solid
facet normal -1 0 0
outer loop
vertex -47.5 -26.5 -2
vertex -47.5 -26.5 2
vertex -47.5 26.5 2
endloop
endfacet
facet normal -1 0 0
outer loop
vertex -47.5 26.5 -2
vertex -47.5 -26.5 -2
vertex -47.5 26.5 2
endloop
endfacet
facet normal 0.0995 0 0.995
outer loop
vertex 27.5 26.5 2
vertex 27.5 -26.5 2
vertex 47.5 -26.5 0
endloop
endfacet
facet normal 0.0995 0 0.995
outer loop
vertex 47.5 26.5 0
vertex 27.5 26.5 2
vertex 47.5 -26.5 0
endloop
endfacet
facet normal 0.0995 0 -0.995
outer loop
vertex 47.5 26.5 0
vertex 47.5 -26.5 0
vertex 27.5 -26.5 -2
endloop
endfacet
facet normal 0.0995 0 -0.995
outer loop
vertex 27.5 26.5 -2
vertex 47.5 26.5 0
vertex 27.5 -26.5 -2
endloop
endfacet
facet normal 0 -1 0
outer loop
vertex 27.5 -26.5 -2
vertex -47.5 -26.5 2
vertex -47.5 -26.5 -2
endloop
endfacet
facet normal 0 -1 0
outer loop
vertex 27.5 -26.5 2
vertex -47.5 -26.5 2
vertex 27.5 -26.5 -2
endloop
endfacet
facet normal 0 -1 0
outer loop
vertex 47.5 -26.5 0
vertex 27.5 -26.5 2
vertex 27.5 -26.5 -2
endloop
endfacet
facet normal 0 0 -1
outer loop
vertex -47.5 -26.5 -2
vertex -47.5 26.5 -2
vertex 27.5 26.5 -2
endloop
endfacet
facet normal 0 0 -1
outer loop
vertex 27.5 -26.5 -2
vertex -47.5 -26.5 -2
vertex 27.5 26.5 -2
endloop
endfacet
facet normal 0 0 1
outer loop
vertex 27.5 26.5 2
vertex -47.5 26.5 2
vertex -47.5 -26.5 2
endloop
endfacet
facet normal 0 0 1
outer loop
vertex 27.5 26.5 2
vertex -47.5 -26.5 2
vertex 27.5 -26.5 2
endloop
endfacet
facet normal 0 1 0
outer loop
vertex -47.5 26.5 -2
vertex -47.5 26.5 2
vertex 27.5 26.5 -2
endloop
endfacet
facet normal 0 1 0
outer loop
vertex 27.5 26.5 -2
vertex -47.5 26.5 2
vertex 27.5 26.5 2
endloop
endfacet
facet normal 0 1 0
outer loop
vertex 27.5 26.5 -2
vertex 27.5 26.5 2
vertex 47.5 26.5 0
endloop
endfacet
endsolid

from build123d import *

# Parameters (mm, degrees)
SKETCH_1_W               = 95
SKETCH_1_H               = 53
EXTRUDE_1_DEPTH          = 2
CUT_EXTRUDE_1_DEPTH      = 55.428852643
CUT_EXTRUDE_1_DEPTH_BACK = 55.428852643


with BuildPart() as part:
    # 草图1 → 凸台-拉伸1 (new, symmetric)
    with BuildSketch(Plane.XY):
        Rectangle(SKETCH_1_W, SKETCH_1_H)
    extrude(amount=EXTRUDE_1_DEPTH, both=True)

    # 草图2 → 切除-拉伸1 (cut, two sides: drawn at the far end of the back side and taken through both)
    with BuildSketch(Plane(origin=(0, 0, 0), x_dir=(1, 0, 0), z_dir=(0, 1, 0)).offset(-CUT_EXTRUDE_1_DEPTH_BACK)):
        Polygon((-131.918074298, -17.94180743), (27.5, -2), (47.5, 0), (27.5, 2), (-131.918074298, 17.94180743), (188.508289392, 17.94180743), (188.508289392, -17.94180743), align=None)
    extrude(amount=CUT_EXTRUDE_1_DEPTH + CUT_EXTRUDE_1_DEPTH_BACK, mode=Mode.SUBTRACT)


solid = part.part
